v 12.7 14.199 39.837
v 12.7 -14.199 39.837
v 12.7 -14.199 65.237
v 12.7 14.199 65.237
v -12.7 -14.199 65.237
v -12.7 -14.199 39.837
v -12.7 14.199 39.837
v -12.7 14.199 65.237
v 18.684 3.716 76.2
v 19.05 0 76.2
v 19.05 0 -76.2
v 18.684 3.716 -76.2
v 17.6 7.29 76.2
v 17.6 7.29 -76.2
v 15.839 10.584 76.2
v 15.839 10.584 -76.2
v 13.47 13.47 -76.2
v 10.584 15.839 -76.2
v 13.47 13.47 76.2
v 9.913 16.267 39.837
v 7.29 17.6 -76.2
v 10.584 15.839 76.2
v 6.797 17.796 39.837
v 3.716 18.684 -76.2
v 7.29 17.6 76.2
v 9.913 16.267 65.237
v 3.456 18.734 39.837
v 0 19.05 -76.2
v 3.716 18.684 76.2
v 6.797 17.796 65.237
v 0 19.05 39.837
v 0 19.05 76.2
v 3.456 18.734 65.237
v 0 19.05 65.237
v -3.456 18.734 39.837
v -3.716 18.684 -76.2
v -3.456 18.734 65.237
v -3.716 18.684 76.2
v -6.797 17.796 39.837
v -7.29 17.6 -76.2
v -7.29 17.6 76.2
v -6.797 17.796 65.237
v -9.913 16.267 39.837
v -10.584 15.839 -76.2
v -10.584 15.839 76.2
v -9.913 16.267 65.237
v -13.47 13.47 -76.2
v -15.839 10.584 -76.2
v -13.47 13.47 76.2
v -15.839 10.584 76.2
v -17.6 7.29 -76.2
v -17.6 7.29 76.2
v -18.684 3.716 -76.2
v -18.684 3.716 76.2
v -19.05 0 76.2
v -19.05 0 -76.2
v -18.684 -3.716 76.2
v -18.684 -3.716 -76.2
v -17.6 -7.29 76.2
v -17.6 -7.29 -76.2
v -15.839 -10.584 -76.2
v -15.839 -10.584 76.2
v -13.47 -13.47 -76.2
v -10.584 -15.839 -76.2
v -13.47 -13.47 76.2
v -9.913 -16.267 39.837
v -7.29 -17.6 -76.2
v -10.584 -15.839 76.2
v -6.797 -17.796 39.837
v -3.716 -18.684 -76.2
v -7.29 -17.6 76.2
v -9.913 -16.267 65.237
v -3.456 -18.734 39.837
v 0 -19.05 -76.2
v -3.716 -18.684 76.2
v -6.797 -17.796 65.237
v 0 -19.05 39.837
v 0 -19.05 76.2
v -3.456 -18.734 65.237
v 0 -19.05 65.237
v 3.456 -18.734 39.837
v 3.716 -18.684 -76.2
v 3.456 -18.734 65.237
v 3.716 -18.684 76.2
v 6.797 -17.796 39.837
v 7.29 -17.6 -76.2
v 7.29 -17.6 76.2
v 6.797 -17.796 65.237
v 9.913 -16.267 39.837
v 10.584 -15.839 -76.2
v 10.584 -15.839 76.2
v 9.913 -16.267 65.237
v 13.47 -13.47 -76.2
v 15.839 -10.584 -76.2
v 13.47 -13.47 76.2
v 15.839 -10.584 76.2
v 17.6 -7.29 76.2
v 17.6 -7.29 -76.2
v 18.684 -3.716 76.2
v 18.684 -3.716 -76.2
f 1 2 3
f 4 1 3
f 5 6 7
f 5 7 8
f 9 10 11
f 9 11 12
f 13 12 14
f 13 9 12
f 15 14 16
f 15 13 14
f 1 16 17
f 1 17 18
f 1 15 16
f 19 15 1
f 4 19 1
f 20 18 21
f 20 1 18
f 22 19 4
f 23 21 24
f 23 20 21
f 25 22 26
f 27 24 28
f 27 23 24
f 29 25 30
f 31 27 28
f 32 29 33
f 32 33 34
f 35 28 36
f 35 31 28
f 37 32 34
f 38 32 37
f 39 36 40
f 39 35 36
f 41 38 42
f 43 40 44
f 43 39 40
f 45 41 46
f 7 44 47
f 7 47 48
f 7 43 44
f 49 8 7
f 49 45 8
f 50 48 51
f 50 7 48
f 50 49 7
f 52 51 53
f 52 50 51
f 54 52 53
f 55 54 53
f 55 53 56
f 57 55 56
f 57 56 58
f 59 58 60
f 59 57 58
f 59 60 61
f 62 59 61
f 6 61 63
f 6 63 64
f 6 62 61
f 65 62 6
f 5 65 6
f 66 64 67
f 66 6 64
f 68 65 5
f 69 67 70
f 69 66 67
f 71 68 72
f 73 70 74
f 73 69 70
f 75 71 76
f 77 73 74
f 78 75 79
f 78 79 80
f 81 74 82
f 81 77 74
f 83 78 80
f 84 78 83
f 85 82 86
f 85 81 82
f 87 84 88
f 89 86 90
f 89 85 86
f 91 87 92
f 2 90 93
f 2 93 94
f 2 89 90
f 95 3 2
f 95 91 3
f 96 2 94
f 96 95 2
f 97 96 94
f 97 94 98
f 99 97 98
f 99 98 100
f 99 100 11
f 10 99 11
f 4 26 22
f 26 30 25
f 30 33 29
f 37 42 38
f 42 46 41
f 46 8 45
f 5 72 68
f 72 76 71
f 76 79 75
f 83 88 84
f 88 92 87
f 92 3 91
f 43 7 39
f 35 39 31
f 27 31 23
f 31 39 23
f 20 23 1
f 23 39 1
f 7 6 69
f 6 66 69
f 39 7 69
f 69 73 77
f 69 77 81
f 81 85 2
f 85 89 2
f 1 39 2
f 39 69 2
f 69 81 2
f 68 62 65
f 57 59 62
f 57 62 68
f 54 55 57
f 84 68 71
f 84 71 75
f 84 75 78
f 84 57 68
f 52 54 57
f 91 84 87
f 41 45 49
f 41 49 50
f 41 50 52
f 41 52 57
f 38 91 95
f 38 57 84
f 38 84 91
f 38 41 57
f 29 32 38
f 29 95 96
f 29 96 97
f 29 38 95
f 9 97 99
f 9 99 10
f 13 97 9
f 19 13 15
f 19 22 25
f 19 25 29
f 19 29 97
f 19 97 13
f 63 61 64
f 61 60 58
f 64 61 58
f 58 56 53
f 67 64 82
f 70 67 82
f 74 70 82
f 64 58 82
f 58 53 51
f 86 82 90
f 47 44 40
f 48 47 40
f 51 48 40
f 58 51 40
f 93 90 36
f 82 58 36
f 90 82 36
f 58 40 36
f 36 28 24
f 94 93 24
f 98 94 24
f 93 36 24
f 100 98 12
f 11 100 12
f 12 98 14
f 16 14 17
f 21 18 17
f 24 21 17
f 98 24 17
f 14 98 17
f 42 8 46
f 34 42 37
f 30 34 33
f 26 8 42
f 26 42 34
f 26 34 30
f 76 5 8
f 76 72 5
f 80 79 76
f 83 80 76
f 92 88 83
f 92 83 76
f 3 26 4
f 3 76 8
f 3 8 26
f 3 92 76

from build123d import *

# Parameters (mm, degrees)
F0_R     = 19.05
F2_DEPTH = 76.2
F1_W     = 25.4
F1_H     = 25.4
F3_DEPTH = 25.4


with BuildPart() as f2:
    # F0 (on Top) → F2 (new body, symmetric)
    with BuildSketch(Plane.XY):
        Circle(F0_R)
    extrude(amount=F2_DEPTH, both=True)

    # F1 (on Front) → F3 (cut, symmetric)
    with BuildSketch(Plane.XZ):
        with Locations((0, 52.537386)):
            Rectangle(F1_W, F1_H)
    extrude(amount=F3_DEPTH, both=True, mode=Mode.SUBTRACT)


solid = f2.part
